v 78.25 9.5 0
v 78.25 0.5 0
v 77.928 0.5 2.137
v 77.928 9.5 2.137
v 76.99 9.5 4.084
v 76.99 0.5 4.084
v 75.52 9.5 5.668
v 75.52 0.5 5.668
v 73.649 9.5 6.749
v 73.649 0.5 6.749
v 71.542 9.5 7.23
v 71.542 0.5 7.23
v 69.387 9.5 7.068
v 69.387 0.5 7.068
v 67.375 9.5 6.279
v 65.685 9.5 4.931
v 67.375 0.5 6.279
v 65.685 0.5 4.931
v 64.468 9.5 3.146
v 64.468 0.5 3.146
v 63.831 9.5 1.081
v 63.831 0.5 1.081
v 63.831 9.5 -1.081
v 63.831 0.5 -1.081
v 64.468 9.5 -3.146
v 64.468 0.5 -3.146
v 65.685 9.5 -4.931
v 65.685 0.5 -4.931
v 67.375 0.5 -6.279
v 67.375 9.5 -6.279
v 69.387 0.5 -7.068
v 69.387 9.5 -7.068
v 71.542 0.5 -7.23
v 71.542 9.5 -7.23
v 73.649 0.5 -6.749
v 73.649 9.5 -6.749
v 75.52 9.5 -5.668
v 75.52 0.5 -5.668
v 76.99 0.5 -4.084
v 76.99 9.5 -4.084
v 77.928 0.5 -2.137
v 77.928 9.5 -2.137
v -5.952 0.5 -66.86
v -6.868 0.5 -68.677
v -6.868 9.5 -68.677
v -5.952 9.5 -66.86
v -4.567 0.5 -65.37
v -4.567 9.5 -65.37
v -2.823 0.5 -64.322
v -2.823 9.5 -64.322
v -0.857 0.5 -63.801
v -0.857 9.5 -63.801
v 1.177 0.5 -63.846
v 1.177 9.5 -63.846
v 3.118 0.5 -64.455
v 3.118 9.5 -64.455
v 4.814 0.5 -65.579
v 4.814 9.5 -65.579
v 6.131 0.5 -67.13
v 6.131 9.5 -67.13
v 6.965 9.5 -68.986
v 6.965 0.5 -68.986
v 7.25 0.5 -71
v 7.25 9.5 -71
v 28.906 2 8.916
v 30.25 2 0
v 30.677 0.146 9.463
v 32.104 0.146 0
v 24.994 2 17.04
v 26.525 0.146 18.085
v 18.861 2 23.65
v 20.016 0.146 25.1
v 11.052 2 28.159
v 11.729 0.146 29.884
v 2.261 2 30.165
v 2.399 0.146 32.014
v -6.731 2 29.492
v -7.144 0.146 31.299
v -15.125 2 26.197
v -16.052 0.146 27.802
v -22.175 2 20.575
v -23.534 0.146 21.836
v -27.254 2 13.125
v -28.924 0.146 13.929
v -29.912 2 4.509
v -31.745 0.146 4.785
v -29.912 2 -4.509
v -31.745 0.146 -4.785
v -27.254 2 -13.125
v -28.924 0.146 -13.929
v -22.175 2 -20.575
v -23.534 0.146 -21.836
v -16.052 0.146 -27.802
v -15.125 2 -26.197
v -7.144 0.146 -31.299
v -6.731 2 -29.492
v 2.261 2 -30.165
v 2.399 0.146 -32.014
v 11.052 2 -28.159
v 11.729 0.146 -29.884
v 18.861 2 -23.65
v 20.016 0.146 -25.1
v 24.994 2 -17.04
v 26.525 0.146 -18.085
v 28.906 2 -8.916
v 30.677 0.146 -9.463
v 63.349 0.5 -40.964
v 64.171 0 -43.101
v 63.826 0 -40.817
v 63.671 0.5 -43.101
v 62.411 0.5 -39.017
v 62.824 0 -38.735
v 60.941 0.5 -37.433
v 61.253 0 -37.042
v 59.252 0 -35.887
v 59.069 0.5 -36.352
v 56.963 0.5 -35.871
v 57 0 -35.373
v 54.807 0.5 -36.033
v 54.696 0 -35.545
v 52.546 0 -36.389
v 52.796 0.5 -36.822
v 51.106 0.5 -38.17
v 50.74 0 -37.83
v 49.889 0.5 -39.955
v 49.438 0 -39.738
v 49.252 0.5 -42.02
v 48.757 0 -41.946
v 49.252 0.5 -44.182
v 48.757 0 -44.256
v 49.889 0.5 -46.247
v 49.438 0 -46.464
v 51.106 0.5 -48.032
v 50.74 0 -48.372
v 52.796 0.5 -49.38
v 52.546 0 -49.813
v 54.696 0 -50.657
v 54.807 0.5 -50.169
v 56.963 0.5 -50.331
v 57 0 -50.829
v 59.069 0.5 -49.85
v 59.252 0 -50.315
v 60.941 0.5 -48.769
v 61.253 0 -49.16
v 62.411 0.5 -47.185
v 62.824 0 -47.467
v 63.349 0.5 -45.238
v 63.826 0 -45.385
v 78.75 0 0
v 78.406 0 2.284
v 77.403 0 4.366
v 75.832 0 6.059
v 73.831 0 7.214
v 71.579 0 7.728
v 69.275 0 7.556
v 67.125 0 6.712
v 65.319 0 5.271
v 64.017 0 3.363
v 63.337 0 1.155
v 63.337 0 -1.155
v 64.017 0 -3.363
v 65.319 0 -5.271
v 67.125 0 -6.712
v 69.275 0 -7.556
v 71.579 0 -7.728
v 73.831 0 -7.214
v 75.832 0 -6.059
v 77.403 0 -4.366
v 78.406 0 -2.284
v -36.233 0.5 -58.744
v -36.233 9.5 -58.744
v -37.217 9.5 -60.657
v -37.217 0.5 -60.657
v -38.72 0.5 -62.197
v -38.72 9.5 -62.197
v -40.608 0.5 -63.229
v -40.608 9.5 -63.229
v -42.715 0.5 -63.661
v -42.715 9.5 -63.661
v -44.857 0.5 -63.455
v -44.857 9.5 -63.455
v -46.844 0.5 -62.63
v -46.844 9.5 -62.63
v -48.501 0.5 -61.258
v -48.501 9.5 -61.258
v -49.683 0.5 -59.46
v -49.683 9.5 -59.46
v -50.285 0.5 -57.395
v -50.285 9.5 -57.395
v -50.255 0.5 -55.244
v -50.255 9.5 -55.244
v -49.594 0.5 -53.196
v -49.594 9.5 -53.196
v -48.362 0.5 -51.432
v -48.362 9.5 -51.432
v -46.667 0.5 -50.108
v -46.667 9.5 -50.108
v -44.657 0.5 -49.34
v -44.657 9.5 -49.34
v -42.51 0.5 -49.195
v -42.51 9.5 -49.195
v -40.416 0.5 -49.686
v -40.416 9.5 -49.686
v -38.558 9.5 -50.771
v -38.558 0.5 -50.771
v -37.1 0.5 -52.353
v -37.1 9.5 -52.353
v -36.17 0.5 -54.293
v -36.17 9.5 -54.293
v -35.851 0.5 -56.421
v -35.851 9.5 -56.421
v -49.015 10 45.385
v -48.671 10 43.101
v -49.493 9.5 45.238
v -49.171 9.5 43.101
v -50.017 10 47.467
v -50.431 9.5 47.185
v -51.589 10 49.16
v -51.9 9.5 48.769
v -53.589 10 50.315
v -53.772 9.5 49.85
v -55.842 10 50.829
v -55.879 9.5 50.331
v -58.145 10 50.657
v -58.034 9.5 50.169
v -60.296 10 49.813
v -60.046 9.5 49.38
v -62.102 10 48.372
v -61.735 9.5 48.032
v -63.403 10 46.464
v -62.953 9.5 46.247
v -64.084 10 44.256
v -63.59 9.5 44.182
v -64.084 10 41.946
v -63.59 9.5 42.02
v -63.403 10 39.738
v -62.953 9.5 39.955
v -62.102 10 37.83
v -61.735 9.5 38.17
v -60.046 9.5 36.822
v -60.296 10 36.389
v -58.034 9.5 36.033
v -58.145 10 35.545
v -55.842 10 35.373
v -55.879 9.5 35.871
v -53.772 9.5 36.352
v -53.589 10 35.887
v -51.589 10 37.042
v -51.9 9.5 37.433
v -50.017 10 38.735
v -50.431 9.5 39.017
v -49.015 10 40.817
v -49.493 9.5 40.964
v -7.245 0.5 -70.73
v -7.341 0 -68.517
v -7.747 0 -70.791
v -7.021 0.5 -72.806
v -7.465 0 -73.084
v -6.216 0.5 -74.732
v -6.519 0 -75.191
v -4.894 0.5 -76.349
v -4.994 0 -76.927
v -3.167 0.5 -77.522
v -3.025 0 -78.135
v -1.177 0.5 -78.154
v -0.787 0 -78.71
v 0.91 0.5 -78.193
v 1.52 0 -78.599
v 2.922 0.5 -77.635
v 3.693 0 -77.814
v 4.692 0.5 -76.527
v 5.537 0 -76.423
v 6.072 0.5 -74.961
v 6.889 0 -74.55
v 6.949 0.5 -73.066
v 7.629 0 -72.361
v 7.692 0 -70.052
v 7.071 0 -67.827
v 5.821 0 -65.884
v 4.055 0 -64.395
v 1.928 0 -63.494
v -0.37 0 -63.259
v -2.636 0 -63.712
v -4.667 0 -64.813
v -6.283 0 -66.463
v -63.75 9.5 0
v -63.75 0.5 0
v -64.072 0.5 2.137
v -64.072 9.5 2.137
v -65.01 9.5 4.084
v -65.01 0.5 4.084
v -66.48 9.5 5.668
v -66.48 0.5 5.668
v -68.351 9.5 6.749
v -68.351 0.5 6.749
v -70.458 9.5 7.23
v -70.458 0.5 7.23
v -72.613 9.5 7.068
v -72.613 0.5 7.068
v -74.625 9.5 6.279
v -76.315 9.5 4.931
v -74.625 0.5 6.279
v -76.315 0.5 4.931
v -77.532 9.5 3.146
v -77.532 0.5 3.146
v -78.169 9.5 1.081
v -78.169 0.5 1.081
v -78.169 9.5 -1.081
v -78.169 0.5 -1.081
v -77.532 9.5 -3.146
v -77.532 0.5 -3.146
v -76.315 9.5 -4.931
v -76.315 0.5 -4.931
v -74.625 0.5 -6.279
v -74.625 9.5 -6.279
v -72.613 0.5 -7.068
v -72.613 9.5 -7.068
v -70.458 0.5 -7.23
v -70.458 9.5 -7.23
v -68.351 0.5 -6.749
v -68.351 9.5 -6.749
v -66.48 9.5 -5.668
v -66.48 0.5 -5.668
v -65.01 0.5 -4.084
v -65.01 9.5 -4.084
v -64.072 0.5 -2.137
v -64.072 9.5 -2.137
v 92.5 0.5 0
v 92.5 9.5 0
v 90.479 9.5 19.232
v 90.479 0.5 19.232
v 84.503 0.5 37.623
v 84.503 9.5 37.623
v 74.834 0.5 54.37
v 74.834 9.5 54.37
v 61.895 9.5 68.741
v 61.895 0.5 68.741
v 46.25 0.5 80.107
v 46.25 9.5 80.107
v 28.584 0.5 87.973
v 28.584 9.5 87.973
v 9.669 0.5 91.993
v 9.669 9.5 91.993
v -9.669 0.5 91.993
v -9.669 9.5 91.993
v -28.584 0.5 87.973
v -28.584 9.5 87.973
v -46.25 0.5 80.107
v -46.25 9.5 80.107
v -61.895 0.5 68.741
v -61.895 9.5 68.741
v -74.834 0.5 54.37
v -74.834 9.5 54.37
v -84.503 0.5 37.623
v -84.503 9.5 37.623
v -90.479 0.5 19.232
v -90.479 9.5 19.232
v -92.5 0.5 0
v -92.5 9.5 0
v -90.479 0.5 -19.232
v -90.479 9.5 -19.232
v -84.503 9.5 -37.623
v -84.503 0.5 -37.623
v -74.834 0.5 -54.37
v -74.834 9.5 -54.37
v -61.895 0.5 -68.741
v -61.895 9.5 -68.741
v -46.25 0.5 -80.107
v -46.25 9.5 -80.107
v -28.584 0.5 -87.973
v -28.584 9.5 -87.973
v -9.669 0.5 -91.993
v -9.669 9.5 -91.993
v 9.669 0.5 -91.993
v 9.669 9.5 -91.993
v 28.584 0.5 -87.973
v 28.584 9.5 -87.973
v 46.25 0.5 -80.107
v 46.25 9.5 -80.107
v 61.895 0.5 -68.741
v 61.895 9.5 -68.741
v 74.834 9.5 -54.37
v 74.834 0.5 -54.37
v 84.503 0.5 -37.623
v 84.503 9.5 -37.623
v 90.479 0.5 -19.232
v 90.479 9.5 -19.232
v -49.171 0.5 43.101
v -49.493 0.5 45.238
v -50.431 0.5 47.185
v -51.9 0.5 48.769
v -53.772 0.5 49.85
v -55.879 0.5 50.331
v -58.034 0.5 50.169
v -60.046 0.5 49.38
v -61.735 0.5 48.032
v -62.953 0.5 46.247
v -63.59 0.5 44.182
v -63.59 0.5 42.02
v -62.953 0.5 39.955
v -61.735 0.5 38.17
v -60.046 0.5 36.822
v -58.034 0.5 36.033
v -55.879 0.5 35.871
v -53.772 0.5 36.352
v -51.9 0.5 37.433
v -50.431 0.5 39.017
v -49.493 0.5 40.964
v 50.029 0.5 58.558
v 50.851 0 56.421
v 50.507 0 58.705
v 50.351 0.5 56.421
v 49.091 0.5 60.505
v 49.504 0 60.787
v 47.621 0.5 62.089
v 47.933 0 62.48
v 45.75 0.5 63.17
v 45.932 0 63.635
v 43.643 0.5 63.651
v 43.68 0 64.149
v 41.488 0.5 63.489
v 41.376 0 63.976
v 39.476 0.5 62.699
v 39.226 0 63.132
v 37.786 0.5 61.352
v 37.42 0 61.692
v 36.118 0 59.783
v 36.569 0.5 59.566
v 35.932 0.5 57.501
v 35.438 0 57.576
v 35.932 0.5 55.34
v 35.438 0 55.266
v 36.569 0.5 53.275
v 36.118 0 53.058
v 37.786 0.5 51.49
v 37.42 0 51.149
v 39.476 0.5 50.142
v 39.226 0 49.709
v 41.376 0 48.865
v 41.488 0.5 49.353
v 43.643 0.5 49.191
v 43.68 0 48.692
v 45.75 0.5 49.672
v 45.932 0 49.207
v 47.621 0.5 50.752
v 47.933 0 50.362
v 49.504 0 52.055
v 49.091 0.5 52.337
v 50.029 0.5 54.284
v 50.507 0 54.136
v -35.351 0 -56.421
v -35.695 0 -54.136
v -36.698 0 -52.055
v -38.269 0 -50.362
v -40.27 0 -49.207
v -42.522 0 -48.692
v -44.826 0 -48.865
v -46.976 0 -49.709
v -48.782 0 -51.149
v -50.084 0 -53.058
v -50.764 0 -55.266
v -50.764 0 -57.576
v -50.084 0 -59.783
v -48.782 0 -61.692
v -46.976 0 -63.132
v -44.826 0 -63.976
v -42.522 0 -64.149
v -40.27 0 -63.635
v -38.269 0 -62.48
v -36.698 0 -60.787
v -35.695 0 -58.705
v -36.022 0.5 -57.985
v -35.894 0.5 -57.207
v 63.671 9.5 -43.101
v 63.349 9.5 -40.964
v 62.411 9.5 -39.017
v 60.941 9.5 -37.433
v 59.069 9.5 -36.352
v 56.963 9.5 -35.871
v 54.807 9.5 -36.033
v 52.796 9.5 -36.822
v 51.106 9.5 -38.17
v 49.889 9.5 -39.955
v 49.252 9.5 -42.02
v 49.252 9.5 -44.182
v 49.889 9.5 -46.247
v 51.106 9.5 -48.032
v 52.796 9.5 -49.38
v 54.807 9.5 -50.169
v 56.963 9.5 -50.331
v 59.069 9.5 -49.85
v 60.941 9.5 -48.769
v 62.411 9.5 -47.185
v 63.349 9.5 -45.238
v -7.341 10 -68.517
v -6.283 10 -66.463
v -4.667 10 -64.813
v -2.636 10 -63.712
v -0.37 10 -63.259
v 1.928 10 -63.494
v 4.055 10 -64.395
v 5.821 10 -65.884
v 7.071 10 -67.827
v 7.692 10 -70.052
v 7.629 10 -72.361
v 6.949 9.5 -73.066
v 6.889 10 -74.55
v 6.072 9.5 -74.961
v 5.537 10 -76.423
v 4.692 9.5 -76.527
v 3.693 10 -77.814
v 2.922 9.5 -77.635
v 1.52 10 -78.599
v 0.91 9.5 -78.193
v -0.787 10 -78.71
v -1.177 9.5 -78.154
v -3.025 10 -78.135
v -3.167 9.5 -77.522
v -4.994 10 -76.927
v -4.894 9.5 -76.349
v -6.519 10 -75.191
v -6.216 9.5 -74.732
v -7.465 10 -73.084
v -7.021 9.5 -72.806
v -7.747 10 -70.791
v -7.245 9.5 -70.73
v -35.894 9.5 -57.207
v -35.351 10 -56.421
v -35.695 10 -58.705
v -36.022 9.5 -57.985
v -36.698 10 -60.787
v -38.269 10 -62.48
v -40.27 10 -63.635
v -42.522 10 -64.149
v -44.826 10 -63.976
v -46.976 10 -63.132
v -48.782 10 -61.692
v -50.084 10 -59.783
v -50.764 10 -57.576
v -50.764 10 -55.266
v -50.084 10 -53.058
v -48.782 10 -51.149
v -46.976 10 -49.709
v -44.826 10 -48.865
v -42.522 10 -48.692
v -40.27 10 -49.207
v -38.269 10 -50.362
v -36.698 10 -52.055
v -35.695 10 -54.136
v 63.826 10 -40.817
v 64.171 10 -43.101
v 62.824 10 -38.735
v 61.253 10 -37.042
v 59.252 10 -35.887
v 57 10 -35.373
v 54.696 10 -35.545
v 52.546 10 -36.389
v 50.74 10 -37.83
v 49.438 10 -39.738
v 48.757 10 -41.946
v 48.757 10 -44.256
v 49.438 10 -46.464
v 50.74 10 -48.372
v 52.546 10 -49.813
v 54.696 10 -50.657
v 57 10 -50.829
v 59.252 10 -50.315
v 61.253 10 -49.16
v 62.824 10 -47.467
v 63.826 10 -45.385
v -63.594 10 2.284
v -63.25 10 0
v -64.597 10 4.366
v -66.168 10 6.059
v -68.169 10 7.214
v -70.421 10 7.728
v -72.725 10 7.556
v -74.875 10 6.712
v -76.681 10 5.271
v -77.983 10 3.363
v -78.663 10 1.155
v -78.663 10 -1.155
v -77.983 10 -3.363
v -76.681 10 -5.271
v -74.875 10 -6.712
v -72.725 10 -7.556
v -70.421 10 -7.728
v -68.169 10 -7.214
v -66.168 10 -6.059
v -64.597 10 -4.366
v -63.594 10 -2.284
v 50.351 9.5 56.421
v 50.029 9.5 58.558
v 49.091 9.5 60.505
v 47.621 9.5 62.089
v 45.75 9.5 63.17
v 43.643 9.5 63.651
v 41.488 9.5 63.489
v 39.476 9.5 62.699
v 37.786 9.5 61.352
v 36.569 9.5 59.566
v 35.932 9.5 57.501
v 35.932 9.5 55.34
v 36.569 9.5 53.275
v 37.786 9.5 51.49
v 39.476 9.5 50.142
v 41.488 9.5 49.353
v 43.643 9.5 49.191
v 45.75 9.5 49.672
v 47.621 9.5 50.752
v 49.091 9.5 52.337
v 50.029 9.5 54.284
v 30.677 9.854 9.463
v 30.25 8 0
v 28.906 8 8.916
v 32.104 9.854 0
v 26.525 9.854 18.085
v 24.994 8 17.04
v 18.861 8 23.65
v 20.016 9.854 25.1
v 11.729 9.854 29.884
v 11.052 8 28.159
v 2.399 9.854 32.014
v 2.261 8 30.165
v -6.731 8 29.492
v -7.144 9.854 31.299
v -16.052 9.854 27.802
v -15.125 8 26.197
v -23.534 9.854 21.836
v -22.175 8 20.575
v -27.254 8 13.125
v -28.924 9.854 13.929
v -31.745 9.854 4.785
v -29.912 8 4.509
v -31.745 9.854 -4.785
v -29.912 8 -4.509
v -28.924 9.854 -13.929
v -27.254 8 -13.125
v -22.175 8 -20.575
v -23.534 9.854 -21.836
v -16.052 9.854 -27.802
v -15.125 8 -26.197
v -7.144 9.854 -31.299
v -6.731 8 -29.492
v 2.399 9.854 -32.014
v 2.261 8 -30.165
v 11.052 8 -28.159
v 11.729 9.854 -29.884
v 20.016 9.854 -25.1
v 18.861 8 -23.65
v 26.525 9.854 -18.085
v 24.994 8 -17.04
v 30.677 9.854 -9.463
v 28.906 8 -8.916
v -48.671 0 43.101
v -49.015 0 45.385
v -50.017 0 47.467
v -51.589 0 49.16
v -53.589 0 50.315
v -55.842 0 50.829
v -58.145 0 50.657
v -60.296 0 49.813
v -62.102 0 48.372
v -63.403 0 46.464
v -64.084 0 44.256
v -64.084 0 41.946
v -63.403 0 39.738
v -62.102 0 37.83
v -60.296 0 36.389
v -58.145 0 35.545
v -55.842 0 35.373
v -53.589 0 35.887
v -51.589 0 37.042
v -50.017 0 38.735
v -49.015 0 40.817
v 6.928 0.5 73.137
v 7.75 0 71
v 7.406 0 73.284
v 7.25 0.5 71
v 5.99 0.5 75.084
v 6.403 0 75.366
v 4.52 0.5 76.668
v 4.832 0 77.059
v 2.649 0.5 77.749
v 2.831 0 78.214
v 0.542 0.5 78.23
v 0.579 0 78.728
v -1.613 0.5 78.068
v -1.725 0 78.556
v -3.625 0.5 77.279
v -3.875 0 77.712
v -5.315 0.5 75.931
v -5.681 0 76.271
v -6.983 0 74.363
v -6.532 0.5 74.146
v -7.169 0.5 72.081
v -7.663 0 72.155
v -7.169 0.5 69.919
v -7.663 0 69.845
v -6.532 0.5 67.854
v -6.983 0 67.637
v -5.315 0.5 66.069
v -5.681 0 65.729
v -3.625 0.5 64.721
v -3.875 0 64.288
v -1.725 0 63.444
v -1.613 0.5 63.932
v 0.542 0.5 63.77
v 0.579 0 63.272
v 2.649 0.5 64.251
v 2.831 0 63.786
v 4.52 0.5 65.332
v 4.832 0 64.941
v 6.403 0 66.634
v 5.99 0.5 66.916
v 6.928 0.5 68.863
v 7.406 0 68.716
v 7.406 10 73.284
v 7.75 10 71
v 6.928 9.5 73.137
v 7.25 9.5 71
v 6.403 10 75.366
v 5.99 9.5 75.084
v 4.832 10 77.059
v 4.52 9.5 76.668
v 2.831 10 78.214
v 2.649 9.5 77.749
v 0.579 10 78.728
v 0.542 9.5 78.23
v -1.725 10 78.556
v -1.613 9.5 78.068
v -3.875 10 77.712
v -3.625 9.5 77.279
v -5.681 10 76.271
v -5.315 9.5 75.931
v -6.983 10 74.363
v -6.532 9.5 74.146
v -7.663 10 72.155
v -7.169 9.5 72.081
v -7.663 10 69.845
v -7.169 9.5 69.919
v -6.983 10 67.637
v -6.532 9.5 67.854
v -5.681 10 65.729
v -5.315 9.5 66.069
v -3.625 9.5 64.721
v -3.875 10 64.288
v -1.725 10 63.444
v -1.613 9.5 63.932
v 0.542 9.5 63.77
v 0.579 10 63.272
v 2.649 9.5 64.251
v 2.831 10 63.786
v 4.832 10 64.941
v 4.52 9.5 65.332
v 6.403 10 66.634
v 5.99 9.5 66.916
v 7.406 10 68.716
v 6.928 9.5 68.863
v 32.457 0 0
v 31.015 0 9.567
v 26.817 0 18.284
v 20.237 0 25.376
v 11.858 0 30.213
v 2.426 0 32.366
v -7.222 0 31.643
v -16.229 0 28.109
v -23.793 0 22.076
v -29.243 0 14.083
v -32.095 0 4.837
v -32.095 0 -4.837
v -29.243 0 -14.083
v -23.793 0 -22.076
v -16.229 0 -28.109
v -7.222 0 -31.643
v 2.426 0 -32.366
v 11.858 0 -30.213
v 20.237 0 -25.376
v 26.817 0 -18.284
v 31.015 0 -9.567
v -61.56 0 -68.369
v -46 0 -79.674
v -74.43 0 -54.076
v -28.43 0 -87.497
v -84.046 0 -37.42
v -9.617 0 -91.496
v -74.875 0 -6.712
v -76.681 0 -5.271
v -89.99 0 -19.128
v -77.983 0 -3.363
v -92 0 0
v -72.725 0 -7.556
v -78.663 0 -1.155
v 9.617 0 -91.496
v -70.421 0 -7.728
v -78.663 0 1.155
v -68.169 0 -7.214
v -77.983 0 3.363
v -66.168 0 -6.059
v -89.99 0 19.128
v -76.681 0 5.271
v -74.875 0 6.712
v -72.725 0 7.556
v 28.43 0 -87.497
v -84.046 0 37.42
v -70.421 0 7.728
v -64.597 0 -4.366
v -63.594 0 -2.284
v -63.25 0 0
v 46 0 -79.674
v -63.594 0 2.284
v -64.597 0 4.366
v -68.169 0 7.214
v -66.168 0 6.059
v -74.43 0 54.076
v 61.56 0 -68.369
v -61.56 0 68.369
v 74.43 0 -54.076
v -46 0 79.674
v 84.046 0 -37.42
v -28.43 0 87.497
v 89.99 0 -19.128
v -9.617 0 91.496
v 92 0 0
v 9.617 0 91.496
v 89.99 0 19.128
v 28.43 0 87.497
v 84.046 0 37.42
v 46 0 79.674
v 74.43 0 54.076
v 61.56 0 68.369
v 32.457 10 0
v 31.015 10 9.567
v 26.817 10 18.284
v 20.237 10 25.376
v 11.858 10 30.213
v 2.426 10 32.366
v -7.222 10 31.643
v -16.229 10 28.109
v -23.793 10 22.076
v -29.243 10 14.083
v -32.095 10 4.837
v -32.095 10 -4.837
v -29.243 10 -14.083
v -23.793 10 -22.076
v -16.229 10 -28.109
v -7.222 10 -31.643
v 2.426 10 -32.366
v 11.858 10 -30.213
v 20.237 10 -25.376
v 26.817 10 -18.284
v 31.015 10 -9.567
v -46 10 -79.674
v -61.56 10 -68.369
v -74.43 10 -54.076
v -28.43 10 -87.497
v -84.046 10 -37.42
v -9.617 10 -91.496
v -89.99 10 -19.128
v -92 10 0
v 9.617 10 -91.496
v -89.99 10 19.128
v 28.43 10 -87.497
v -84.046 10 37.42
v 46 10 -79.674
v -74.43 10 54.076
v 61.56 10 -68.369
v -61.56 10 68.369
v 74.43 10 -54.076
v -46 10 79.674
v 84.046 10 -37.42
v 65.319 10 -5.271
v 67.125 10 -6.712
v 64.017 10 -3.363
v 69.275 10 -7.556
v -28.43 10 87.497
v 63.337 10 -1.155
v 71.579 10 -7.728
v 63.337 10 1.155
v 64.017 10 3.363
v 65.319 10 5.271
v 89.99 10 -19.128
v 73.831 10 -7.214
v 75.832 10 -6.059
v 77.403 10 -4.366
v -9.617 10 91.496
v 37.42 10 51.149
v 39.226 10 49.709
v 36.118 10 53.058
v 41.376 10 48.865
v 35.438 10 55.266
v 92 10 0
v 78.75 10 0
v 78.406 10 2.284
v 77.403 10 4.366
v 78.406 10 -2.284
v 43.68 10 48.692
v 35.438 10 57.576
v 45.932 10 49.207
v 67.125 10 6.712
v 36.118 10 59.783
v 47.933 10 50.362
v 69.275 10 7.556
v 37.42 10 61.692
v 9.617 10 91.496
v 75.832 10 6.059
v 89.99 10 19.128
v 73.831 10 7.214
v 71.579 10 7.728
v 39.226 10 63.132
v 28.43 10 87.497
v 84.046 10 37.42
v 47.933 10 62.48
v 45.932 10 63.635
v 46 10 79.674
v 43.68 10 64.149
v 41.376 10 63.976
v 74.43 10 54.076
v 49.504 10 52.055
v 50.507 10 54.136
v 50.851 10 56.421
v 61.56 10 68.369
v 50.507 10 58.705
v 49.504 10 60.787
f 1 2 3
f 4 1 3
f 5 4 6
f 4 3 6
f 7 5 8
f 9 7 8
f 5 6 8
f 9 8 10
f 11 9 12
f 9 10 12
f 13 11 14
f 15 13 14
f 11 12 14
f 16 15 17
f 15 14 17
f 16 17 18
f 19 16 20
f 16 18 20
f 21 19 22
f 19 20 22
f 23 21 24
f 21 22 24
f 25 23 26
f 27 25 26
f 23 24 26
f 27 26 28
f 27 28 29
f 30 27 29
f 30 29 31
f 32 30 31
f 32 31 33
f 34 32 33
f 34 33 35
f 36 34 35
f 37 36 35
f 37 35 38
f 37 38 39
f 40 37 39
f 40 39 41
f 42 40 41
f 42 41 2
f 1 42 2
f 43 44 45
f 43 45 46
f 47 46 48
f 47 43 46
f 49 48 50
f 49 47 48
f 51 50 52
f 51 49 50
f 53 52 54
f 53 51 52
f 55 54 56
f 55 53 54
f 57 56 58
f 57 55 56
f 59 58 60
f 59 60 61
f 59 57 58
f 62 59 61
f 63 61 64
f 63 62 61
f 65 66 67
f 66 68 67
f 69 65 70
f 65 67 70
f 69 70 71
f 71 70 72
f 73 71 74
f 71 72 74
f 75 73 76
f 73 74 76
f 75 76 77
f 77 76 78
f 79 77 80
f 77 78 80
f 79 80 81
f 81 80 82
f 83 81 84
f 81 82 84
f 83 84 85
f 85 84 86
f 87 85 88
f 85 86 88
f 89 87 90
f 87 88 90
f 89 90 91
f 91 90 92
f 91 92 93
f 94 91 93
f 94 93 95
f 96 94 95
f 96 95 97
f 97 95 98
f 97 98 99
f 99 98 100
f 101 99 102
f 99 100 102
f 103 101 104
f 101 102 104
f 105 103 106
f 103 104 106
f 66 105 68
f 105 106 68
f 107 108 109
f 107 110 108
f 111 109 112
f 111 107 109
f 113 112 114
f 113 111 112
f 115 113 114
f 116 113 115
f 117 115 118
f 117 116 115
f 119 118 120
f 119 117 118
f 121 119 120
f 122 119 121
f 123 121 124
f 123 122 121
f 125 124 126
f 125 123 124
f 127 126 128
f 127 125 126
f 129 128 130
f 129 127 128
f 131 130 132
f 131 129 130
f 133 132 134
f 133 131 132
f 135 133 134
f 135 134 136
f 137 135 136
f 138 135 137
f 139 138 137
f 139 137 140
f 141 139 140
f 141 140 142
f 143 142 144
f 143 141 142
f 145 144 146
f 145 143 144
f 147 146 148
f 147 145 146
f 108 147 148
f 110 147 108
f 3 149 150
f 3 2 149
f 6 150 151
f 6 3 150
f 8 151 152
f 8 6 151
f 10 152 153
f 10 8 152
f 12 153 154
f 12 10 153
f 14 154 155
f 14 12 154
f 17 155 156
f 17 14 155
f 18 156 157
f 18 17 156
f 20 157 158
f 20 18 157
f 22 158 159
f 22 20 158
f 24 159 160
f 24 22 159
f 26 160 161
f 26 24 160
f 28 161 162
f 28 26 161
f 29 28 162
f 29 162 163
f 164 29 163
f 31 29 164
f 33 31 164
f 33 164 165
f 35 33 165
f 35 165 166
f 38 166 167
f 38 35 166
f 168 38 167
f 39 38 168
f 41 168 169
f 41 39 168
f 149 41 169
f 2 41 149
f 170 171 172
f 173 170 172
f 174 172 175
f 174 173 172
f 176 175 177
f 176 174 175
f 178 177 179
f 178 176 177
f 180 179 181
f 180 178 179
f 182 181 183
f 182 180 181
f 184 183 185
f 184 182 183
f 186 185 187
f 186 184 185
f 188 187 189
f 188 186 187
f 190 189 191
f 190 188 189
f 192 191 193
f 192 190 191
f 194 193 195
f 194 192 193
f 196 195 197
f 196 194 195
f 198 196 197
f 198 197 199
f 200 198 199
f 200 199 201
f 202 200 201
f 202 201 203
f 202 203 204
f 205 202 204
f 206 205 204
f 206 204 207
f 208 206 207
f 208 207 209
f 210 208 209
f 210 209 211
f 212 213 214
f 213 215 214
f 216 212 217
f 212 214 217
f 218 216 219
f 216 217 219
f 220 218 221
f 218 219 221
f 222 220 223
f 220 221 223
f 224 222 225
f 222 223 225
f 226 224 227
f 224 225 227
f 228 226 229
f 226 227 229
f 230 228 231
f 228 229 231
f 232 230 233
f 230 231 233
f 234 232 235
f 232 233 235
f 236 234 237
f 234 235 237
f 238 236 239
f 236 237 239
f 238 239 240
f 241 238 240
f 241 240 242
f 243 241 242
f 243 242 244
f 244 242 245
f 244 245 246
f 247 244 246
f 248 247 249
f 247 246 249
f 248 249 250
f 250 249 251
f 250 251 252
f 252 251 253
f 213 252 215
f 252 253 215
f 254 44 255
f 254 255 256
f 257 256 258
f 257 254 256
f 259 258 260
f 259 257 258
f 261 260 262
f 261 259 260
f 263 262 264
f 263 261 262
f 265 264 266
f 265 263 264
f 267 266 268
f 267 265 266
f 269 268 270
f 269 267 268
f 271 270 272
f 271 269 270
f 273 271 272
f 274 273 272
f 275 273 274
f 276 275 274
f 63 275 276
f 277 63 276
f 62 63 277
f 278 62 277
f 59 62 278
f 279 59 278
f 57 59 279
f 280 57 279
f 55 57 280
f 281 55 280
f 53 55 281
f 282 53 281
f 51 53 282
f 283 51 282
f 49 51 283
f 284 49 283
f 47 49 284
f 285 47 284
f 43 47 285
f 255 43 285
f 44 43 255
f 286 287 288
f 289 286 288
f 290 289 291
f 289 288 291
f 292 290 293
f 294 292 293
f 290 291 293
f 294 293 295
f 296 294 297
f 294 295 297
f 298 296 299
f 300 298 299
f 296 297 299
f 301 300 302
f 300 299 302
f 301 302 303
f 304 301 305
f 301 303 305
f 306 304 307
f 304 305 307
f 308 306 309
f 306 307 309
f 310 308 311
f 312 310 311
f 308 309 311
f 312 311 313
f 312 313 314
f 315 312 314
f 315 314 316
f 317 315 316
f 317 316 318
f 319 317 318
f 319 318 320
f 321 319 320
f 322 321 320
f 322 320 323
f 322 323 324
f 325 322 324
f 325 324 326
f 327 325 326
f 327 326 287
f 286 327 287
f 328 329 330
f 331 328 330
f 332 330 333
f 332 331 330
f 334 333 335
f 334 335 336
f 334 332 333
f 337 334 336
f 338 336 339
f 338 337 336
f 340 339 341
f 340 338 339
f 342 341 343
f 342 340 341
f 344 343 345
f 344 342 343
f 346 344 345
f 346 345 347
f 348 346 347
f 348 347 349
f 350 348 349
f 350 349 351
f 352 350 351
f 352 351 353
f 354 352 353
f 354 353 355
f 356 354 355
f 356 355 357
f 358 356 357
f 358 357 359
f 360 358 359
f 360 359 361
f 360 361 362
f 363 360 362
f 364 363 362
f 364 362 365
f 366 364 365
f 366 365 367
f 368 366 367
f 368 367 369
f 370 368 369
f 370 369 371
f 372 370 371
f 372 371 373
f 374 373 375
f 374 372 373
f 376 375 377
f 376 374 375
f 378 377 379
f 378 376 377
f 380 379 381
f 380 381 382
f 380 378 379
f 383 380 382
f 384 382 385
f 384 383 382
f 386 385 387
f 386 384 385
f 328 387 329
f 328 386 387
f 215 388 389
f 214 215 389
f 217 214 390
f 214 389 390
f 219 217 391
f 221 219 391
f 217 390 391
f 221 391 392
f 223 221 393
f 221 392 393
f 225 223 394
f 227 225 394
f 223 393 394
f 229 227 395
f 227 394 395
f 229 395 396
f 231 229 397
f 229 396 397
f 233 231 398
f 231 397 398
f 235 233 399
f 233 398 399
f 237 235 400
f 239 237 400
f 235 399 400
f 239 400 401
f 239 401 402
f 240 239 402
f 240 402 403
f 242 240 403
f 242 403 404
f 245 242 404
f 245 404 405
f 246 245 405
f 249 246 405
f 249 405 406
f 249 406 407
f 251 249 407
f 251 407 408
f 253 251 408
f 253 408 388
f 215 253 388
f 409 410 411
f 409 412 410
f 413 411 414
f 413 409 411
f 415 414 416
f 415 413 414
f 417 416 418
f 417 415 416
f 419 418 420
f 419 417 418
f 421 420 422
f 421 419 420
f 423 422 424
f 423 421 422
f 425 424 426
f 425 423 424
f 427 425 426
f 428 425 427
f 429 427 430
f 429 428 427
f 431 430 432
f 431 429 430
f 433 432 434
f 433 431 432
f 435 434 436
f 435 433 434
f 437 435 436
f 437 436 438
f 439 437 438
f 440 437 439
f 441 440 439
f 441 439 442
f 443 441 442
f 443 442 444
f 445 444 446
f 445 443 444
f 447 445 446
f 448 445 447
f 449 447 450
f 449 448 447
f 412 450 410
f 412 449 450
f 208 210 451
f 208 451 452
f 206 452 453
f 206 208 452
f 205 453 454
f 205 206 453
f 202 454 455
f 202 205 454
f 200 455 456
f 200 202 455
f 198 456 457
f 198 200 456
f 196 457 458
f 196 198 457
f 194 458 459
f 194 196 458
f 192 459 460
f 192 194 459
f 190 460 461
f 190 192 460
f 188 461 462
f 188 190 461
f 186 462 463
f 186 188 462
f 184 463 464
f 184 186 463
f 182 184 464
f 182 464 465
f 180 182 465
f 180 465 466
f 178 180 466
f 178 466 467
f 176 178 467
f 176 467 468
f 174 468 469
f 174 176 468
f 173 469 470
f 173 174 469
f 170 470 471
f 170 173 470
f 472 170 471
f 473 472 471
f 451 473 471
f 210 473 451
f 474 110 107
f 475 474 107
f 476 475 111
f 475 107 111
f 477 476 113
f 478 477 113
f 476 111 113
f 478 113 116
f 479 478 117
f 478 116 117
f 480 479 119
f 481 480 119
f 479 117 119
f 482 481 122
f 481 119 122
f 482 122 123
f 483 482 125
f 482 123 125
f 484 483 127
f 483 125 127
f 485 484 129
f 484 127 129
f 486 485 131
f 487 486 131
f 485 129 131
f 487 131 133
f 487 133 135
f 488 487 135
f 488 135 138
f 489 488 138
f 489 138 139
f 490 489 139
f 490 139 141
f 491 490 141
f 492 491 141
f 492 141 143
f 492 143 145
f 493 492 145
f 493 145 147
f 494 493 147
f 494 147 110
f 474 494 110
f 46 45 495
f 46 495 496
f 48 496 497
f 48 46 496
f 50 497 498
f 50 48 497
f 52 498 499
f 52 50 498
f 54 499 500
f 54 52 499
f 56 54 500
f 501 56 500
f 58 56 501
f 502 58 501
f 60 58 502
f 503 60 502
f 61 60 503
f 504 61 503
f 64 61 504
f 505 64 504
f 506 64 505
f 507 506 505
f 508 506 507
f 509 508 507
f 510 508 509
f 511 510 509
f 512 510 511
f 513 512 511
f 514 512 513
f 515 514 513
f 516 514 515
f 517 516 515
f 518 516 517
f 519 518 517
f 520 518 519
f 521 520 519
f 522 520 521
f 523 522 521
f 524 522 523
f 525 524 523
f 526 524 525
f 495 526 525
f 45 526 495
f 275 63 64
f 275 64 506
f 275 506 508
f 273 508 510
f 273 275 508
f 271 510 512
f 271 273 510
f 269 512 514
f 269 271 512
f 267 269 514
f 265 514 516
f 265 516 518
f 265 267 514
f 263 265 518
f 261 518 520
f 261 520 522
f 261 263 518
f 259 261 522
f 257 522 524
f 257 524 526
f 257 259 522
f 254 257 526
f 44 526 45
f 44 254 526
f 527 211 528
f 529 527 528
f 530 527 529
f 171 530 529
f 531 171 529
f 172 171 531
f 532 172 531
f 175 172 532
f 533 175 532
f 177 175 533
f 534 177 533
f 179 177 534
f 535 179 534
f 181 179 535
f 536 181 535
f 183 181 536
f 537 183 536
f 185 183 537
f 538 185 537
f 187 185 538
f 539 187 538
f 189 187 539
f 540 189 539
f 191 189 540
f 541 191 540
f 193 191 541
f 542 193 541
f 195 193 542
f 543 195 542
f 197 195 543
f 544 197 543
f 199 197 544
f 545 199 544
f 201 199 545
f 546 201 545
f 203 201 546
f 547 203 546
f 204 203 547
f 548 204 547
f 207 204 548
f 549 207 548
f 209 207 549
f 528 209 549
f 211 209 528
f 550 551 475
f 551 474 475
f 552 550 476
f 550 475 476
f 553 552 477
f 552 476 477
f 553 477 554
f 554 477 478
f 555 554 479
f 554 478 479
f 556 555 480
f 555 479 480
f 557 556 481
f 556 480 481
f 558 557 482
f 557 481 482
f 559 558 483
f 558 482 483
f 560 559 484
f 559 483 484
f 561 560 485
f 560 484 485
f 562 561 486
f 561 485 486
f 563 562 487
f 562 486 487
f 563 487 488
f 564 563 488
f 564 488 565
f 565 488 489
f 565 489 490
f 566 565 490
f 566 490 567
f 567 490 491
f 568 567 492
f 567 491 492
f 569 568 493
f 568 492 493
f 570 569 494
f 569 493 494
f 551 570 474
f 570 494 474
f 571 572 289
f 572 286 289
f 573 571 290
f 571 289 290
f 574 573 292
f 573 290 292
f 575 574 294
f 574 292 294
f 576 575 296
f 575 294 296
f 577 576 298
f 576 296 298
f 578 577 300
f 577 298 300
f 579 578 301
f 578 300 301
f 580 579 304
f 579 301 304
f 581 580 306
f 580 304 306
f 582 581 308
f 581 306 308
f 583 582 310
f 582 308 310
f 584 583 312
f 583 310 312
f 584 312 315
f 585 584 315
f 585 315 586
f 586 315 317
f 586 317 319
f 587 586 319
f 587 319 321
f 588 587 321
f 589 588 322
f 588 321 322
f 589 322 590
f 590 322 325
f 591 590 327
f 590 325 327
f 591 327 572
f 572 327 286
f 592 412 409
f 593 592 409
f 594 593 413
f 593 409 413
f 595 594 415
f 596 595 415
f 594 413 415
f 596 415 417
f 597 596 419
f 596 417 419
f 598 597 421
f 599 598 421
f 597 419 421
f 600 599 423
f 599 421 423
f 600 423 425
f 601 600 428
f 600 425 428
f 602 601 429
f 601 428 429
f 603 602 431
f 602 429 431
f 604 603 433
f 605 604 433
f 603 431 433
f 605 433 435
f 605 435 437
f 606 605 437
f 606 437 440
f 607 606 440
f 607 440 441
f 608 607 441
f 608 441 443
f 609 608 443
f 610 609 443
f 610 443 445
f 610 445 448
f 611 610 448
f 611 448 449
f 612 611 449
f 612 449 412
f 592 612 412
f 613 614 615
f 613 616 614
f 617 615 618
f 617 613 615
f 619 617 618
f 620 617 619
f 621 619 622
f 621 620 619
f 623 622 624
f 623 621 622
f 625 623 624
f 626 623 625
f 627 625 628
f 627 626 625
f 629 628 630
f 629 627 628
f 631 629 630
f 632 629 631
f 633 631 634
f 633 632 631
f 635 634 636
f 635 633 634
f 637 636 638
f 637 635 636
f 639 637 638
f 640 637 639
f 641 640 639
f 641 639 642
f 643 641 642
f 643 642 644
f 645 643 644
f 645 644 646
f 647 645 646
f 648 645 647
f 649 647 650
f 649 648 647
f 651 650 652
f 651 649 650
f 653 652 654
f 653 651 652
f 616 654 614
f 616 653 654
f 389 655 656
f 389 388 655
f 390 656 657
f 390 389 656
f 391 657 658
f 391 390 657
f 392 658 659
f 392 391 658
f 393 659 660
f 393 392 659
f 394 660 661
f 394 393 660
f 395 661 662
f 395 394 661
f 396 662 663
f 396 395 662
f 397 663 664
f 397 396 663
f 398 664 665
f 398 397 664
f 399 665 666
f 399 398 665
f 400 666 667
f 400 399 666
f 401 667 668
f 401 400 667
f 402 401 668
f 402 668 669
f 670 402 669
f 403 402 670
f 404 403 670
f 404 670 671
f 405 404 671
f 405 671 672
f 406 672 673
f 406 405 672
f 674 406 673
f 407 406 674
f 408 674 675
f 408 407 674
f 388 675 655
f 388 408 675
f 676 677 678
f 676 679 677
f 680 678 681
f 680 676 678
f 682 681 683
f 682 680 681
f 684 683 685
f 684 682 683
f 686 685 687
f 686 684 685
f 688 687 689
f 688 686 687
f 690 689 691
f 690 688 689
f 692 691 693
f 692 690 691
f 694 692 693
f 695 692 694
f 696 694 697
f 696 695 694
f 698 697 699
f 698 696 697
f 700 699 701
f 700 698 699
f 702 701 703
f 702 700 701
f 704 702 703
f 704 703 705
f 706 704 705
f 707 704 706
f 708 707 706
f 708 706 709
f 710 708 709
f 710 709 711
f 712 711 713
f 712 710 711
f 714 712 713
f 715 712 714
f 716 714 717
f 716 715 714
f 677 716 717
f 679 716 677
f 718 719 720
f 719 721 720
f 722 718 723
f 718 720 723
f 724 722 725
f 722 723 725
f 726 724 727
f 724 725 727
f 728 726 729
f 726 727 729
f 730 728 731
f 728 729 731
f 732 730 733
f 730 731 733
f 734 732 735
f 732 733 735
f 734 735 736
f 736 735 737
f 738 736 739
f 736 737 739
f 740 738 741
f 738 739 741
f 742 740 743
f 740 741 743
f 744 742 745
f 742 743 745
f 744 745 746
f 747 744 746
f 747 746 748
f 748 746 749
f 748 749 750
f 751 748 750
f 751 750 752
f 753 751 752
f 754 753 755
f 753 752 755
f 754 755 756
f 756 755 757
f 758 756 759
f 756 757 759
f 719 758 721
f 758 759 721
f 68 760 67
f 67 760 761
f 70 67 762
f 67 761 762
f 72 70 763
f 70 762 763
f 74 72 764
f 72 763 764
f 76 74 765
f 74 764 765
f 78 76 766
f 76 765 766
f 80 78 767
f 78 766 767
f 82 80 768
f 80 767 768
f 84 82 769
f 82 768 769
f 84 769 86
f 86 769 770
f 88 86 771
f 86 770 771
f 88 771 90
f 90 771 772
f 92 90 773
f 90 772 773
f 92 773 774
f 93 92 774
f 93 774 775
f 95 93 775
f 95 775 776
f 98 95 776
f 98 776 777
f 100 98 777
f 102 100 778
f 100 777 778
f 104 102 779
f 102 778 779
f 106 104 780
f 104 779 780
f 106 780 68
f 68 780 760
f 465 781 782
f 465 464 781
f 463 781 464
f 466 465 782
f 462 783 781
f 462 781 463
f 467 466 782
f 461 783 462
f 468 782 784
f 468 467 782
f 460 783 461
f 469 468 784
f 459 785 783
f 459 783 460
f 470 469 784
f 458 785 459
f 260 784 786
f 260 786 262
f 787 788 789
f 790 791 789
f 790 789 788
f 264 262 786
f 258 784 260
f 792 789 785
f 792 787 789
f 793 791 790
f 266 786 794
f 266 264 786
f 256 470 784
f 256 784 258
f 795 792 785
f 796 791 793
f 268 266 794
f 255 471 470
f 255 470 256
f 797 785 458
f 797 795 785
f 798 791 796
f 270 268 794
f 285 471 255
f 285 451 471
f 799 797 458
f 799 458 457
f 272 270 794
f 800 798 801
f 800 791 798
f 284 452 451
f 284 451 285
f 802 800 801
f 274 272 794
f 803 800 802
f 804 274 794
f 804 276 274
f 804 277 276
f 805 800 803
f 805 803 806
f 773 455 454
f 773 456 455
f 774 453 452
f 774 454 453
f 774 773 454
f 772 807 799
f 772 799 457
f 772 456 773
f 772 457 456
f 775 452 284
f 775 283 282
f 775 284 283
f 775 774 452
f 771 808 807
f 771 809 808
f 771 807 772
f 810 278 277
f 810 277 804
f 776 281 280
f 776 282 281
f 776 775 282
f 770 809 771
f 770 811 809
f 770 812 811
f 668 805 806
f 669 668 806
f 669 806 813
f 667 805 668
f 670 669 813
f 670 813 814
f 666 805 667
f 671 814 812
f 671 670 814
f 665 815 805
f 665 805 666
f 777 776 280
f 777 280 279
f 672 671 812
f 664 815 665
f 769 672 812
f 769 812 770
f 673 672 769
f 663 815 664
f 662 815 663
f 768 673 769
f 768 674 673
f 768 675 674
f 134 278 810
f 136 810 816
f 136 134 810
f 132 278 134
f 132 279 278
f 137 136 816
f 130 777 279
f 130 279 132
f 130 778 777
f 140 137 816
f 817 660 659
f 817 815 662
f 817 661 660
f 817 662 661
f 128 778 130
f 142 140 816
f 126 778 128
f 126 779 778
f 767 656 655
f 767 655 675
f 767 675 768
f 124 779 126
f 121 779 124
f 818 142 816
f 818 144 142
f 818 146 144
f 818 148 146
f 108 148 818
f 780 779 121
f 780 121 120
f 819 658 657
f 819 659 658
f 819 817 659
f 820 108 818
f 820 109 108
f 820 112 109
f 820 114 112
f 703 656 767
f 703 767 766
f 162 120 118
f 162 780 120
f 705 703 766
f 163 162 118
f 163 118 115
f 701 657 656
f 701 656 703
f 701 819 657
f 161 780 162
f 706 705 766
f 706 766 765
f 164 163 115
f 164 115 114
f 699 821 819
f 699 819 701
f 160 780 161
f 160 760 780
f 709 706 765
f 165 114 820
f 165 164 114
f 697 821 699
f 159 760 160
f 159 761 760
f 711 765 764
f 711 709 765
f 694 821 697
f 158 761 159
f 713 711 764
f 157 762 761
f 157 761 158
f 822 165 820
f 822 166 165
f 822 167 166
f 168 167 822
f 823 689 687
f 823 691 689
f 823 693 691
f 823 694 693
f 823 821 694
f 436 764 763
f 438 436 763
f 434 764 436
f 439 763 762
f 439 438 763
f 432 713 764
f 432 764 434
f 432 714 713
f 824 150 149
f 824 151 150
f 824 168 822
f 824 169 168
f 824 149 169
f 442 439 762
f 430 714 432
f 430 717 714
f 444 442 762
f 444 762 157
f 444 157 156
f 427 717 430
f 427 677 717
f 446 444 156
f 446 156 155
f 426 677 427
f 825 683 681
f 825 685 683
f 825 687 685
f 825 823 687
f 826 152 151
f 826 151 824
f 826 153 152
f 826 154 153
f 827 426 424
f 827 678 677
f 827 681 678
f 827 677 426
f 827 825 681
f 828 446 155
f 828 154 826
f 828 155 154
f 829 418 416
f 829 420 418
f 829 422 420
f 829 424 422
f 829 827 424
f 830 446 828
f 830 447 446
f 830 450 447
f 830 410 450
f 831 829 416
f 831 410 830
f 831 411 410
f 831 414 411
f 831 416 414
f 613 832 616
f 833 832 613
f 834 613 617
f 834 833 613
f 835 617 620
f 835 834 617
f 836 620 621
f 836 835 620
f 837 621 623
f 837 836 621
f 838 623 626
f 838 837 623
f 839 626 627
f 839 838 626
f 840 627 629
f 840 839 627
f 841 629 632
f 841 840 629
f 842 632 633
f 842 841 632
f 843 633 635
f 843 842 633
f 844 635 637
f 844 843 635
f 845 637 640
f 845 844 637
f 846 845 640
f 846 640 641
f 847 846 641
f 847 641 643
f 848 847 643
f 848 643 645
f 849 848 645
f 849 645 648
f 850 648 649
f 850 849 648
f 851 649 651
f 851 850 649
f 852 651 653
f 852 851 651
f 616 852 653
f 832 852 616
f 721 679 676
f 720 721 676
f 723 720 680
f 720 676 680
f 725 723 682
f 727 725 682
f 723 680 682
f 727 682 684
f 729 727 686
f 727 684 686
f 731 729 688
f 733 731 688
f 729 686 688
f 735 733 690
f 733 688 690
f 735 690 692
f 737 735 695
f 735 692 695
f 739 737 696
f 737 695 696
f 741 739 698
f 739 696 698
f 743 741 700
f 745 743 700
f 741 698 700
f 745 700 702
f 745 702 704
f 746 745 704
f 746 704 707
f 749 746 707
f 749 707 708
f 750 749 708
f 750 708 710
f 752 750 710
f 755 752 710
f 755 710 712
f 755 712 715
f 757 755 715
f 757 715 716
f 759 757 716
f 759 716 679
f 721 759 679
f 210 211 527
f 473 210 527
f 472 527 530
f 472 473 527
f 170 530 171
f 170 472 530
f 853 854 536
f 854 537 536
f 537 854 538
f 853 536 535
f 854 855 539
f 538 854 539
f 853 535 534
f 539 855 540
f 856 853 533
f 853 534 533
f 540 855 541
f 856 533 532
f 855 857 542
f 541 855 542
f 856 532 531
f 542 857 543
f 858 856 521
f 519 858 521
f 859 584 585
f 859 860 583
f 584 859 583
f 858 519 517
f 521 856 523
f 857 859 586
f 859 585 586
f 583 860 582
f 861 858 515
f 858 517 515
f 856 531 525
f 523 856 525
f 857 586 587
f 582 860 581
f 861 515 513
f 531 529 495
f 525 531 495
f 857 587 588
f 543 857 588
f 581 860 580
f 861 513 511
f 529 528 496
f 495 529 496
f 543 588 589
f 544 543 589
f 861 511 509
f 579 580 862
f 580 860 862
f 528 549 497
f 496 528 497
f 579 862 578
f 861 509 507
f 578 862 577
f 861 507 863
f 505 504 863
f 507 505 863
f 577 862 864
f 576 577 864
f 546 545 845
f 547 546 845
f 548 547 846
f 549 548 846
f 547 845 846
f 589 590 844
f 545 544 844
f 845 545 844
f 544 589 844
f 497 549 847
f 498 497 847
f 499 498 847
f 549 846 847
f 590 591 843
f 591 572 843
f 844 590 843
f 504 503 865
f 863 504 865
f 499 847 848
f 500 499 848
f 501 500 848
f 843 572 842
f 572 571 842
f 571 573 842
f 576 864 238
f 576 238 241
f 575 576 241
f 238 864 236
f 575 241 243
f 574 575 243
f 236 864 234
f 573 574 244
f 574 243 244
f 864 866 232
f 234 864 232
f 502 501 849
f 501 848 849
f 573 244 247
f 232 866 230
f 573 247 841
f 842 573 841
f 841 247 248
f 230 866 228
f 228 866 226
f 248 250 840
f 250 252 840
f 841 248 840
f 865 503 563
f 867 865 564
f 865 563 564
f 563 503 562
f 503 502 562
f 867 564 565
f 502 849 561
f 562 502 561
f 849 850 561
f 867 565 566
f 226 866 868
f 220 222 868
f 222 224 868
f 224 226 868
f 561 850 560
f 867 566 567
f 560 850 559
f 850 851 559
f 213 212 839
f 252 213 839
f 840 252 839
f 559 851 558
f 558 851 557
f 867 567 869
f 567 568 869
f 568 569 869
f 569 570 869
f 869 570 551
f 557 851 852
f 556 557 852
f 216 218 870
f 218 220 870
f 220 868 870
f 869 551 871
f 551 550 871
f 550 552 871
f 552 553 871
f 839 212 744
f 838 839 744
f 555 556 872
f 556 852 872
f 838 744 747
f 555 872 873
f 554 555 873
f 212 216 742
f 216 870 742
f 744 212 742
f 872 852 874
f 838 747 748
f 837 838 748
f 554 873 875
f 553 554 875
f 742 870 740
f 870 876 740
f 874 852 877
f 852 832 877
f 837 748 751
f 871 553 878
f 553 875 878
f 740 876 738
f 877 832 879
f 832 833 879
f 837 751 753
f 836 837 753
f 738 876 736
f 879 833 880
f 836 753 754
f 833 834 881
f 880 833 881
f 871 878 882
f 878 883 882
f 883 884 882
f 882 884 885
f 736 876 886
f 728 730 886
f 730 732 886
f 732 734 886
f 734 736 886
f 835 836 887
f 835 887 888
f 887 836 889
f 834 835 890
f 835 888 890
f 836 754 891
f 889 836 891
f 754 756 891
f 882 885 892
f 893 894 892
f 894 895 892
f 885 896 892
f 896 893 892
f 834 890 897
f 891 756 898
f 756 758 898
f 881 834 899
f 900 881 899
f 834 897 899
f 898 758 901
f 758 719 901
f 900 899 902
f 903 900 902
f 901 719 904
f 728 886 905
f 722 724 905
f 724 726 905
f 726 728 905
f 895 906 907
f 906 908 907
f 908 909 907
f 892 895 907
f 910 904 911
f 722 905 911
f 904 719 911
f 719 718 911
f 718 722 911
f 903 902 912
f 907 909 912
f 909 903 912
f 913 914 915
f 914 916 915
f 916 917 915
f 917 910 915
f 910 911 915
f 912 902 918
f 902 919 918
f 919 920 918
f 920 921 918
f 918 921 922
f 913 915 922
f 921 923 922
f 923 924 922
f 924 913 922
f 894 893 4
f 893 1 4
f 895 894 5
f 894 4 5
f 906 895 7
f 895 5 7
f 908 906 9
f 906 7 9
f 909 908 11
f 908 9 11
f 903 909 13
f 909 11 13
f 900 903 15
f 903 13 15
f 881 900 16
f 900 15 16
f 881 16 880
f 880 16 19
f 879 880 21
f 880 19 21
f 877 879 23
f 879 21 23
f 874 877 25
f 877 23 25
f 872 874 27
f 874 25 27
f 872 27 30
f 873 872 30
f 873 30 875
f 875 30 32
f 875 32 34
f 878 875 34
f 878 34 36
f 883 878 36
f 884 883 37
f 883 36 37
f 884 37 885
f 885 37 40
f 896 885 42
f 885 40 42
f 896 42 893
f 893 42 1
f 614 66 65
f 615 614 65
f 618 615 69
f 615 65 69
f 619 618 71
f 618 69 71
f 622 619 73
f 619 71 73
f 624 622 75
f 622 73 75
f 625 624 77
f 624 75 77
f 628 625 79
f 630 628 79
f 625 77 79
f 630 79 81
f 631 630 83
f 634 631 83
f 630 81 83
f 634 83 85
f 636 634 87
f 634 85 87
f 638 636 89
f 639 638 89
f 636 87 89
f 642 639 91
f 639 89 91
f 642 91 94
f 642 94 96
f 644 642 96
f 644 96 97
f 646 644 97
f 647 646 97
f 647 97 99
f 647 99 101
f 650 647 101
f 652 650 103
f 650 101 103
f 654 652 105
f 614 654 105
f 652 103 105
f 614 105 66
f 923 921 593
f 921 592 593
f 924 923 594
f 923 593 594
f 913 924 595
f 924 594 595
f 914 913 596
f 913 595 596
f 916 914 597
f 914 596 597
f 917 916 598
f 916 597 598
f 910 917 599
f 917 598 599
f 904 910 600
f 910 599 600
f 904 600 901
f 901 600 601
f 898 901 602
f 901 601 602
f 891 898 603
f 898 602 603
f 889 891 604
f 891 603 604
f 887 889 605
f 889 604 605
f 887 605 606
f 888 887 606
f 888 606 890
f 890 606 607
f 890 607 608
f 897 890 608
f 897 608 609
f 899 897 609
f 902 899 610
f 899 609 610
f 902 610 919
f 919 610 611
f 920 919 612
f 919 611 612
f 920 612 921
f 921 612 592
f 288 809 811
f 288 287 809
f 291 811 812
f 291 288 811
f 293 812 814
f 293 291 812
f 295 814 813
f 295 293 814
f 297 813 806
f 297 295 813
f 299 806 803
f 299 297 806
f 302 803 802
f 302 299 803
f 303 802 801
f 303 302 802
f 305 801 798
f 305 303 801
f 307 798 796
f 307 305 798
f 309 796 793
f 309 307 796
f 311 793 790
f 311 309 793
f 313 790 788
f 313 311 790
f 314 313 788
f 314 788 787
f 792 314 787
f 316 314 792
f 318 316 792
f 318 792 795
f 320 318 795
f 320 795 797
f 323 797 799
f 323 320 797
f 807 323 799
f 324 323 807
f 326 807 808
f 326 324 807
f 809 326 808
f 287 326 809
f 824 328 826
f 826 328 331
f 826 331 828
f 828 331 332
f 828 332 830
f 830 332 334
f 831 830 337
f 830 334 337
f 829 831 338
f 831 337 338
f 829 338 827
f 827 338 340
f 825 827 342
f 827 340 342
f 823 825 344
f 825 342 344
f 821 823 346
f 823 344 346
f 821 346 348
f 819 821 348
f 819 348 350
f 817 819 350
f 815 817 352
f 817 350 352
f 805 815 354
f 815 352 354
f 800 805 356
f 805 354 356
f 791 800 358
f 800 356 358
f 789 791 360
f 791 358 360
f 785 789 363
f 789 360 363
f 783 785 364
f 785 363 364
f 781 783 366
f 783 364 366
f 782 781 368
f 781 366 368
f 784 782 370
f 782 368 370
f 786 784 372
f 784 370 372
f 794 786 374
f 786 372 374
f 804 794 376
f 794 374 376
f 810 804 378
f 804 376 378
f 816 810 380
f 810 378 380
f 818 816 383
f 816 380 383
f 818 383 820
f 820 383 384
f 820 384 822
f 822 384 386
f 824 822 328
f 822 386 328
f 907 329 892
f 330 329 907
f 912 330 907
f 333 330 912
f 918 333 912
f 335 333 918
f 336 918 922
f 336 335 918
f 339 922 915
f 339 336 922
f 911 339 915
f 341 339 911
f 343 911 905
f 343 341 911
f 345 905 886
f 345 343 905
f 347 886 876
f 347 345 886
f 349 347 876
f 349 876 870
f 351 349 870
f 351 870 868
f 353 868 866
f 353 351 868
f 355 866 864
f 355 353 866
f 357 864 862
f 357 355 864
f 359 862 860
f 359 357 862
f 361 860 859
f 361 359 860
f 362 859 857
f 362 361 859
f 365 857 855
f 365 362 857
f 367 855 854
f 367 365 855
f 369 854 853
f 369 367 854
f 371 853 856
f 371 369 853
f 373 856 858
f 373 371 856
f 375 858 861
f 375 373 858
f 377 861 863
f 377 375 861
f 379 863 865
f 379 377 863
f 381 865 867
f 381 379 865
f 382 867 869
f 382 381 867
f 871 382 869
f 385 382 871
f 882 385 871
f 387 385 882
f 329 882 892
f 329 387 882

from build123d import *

# Parameters (mm, degrees)
F0_R     = 92.5
F0_R_2   = 7.25
F0_R_3   = 30.25
F1_DEPTH = 10
F2_SIZE2 = 2
F2_SIZE  = 2
F3_SIZE2 = 2
F3_SIZE  = 2


# Not quite as in the source:
# - a fillet or chamfer that OpenCascade refuses, or shapes differently, is made with other operations: its cross-section is extruded or revolved along the edge and cut away or added


with BuildPart() as f1:
    # F0 (on Front) → F1 (new body)
    with BuildSketch(Plane.XZ):
        Circle(F0_R)
        with BuildLine():
            ThreePointArc((-35.8509998507, -56.4207746479), (-35.9472026921, -57.5979263852), (-36.2332581163, -58.7438380282))
            ThreePointArc((-36.2332581163, -58.7438380282), (-50.2547970094, -55.2436229106), (-35.8509998507, -56.4207746479))
        make_face(mode=Mode.SUBTRACT)
        with BuildLine():
            ThreePointArc((-6.8677417345, -68.6769366197), (1.1771517373, -63.8462028413), (7.25, -71))
            ThreePointArc((7.25, -71), (-1.1771517373, -78.1537971587), (-6.8677417345, -68.6769366197))
        make_face(mode=Mode.SUBTRACT)
        with Locations((56.4207746479, -43.1009998507)):
            Circle(F0_R_2, mode=Mode.SUBTRACT)
        with Locations((-71, 0)):
            Circle(F0_R_2, mode=Mode.SUBTRACT)
        with Locations((-56.4207746479, 43.1009998507)):
            Circle(F0_R_2, mode=Mode.SUBTRACT)
        Circle(F0_R_3, mode=Mode.SUBTRACT)
        with Locations((71, 0)):
            Circle(F0_R_2, mode=Mode.SUBTRACT)
        with Locations((43.1009998507, 56.4207746479)):
            Circle(F0_R_2, mode=Mode.SUBTRACT)
        with Locations((0, 71)):
            Circle(F0_R_2, mode=Mode.SUBTRACT)
    extrude(amount=-F1_DEPTH)

    # F2
    f2_edges = [f1.edges().sort_by_distance(p)[0] for p in [
        (-30.25, 0, 0),
    ]]
    chamfer(f2_edges, length=F2_SIZE, length2=F2_SIZE2)

    # F3
    f3_edges = [f1.edges().sort_by_distance(p)[0] for p in [
        (-30.25, 10, 0),
    ]]
    chamfer(f3_edges, length=F3_SIZE, length2=F3_SIZE2)

    # F4: chamfer of 0.5 on 10 edges, made by hand

    # F4_s1 → F4_t2 (revolve, cut)
    with BuildSketch(Plane.XY):
        Polygon((32.1035533906, 9.8535533906), (32.4571067812, 10), (32.25, 10), align=None)
    revolve(axis=Axis((0, 10, 0), (0, -1, 0)), mode=Mode.SUBTRACT)

    # F4_s3 → F4_t4 (revolve, cut)
    with BuildSketch(Plane.XY):
        Polygon((92, 10), (92.5, 9.5), (92.5, 10), align=None)
    revolve(axis=Axis((0, 10, 0), (0, -1, 0)), mode=Mode.SUBTRACT)

    # F4_s5 → F4_t6 (revolve, cut)
    with BuildSketch(Plane.XY.offset(-56.4207746479)):
        Polygon((-35.3509998507, 10), (-35.8509998507, 9.5), (-35.8509998507, 10), align=None)
    revolve(axis=Axis((-43.1009998507, 10, -56.4207746479), (0, 1, 0)), mode=Mode.SUBTRACT)

    # F4_s7 → F4_t8 (revolve, cut)
    with BuildSketch(Plane(origin=(-21.5504999254, 0, -63.7103873239), x_dir=(0, 1, 0), z_dir=(-0.3204225352, 0, -0.947274722))):
        Polygon((10, 15), (9.5, 15.5), (10, 15.5), align=None)
    revolve(axis=Axis((0, 10, -71), (0, 1, 0)), mode=Mode.SUBTRACT)

    # F4_s9 → F4_t10 (revolve, cut)
    with BuildSketch(Plane.XY.offset(-43.1009998507)):
        Polygon((64.1707746479, 10), (63.6707746479, 9.5), (63.6707746479, 10), align=None)
    revolve(axis=Axis((56.4207746479, 10, -43.1009998507), (0, -1, 0)), mode=Mode.SUBTRACT)

    # F4_s11 → F4_t12 (revolve, cut)
    with BuildSketch(Plane.XY):
        Polygon((-63.25, 10), (-63.75, 9.5), (-63.75, 10), align=None)
    revolve(axis=Axis((-71, 10, 0), (0, -1, 0)), mode=Mode.SUBTRACT)

    # F4_s13 → F4_t14 (revolve, cut)
    with BuildSketch(Plane.XY.offset(43.1009998507)):
        Polygon((-48.6707746479, 10), (-49.1707746479, 9.5), (-49.1707746479, 10), align=None)
    revolve(axis=Axis((-56.4207746479, 10, 43.1009998507), (0, -1, 0)), mode=Mode.SUBTRACT)

    # F4_s15 → F4_t16 (revolve, cut)
    with BuildSketch(Plane.XY):
        Polygon((78.75, 10), (78.25, 9.5), (78.25, 10), align=None)
    revolve(axis=Axis((71, 10, 0), (0, -1, 0)), mode=Mode.SUBTRACT)

    # F4_s17 → F4_t18 (revolve, cut)
    with BuildSketch(Plane.XY.offset(56.4207746479)):
        Polygon((50.8509998507, 10), (50.3509998507, 9.5), (50.3509998507, 10), align=None)
    revolve(axis=Axis((43.1009998507, 10, 56.4207746479), (0, -1, 0)), mode=Mode.SUBTRACT)

    # F4_s19 → F4_t20 (revolve, cut)
    with BuildSketch(Plane.XY.offset(71)):
        Polygon((7.75, 10), (7.25, 9.5), (7.25, 10), align=None)
    revolve(axis=Axis((0, 10, 71), (0, -1, 0)), mode=Mode.SUBTRACT)

    # F5: chamfer of 0.5 on 10 edges, made by hand

    # F5_s1 → F5_t2 (revolve, cut)
    with BuildSketch(Plane.XY):
        Polygon((32.1035533906, 0.1464466094), (32.4571067812, 0), (32.25, 0), align=None)
    revolve(axis=Axis((0, 0, 0), (0, -1, 0)), mode=Mode.SUBTRACT)

    # F5_s3 → F5_t4 (revolve, cut)
    with BuildSketch(Plane.XY):
        Polygon((92, 0), (92.5, 0.5), (92.5, 0), align=None)
    revolve(axis=Axis((0, 0, 0), (0, -1, 0)), mode=Mode.SUBTRACT)

    # F5_s5 → F5_t6 (revolve, cut)
    with BuildSketch(Plane.XY.offset(-56.4207746479)):
        Polygon((-35.3509998507, 0), (-35.8509998507, 0.5), (-35.8509998507, 0), align=None)
    revolve(axis=Axis((-43.1009998507, 0, -56.4207746479), (0, -1, 0)), mode=Mode.SUBTRACT)

    # F5_s7 → F5_t8 (revolve, cut)
    with BuildSketch(Plane(origin=(-21.5504999254, 0, -63.7103873239), x_dir=(0, 1, 0), z_dir=(0.3204225352, 0, 0.947274722))):
        Polygon((0, -15), (0.5, -15.5), (0, -15.5), align=None)
    revolve(axis=Axis((0, 0, -71), (0, -1, 0)), mode=Mode.SUBTRACT)

    # F5_s9 → F5_t10 (revolve, cut)
    with BuildSketch(Plane.XY.offset(-43.1009998507)):
        Polygon((64.1707746479, 0), (63.6707746479, 0.5), (63.6707746479, 0), align=None)
    revolve(axis=Axis((56.4207746479, 0, -43.1009998507), (0, -1, 0)), mode=Mode.SUBTRACT)

    # F5_s11 → F5_t12 (revolve, cut)
    with BuildSketch(Plane.XY):
        Polygon((-63.25, 0), (-63.75, 0.5), (-63.75, 0), align=None)
    revolve(axis=Axis((-71, 0, 0), (0, -1, 0)), mode=Mode.SUBTRACT)

    # F5_s13 → F5_t14 (revolve, cut)
    with BuildSketch(Plane.XY.offset(43.1009998507)):
        Polygon((-48.6707746479, 0), (-49.1707746479, 0.5), (-49.1707746479, 0), align=None)
    revolve(axis=Axis((-56.4207746479, 0, 43.1009998507), (0, -1, 0)), mode=Mode.SUBTRACT)

    # F5_s15 → F5_t16 (revolve, cut)
    with BuildSketch(Plane.XY):
        Polygon((78.75, 0), (78.25, 0.5), (78.25, 0), align=None)
    revolve(axis=Axis((71, 0, 0), (0, -1, 0)), mode=Mode.SUBTRACT)

    # F5_s17 → F5_t18 (revolve, cut)
    with BuildSketch(Plane.XY.offset(56.4207746479)):
        Polygon((50.8509998507, 0), (50.3509998507, 0.5), (50.3509998507, 0), align=None)
    revolve(axis=Axis((43.1009998507, 0, 56.4207746479), (0, -1, 0)), mode=Mode.SUBTRACT)

    # F5_s19 → F5_t20 (revolve, cut)
    with BuildSketch(Plane.XY.offset(71)):
        Polygon((7.75, 0), (7.25, 0.5), (7.25, 0), align=None)
    revolve(axis=Axis((0, 0, 71), (0, -1, 0)), mode=Mode.SUBTRACT)


solid = f1.part
